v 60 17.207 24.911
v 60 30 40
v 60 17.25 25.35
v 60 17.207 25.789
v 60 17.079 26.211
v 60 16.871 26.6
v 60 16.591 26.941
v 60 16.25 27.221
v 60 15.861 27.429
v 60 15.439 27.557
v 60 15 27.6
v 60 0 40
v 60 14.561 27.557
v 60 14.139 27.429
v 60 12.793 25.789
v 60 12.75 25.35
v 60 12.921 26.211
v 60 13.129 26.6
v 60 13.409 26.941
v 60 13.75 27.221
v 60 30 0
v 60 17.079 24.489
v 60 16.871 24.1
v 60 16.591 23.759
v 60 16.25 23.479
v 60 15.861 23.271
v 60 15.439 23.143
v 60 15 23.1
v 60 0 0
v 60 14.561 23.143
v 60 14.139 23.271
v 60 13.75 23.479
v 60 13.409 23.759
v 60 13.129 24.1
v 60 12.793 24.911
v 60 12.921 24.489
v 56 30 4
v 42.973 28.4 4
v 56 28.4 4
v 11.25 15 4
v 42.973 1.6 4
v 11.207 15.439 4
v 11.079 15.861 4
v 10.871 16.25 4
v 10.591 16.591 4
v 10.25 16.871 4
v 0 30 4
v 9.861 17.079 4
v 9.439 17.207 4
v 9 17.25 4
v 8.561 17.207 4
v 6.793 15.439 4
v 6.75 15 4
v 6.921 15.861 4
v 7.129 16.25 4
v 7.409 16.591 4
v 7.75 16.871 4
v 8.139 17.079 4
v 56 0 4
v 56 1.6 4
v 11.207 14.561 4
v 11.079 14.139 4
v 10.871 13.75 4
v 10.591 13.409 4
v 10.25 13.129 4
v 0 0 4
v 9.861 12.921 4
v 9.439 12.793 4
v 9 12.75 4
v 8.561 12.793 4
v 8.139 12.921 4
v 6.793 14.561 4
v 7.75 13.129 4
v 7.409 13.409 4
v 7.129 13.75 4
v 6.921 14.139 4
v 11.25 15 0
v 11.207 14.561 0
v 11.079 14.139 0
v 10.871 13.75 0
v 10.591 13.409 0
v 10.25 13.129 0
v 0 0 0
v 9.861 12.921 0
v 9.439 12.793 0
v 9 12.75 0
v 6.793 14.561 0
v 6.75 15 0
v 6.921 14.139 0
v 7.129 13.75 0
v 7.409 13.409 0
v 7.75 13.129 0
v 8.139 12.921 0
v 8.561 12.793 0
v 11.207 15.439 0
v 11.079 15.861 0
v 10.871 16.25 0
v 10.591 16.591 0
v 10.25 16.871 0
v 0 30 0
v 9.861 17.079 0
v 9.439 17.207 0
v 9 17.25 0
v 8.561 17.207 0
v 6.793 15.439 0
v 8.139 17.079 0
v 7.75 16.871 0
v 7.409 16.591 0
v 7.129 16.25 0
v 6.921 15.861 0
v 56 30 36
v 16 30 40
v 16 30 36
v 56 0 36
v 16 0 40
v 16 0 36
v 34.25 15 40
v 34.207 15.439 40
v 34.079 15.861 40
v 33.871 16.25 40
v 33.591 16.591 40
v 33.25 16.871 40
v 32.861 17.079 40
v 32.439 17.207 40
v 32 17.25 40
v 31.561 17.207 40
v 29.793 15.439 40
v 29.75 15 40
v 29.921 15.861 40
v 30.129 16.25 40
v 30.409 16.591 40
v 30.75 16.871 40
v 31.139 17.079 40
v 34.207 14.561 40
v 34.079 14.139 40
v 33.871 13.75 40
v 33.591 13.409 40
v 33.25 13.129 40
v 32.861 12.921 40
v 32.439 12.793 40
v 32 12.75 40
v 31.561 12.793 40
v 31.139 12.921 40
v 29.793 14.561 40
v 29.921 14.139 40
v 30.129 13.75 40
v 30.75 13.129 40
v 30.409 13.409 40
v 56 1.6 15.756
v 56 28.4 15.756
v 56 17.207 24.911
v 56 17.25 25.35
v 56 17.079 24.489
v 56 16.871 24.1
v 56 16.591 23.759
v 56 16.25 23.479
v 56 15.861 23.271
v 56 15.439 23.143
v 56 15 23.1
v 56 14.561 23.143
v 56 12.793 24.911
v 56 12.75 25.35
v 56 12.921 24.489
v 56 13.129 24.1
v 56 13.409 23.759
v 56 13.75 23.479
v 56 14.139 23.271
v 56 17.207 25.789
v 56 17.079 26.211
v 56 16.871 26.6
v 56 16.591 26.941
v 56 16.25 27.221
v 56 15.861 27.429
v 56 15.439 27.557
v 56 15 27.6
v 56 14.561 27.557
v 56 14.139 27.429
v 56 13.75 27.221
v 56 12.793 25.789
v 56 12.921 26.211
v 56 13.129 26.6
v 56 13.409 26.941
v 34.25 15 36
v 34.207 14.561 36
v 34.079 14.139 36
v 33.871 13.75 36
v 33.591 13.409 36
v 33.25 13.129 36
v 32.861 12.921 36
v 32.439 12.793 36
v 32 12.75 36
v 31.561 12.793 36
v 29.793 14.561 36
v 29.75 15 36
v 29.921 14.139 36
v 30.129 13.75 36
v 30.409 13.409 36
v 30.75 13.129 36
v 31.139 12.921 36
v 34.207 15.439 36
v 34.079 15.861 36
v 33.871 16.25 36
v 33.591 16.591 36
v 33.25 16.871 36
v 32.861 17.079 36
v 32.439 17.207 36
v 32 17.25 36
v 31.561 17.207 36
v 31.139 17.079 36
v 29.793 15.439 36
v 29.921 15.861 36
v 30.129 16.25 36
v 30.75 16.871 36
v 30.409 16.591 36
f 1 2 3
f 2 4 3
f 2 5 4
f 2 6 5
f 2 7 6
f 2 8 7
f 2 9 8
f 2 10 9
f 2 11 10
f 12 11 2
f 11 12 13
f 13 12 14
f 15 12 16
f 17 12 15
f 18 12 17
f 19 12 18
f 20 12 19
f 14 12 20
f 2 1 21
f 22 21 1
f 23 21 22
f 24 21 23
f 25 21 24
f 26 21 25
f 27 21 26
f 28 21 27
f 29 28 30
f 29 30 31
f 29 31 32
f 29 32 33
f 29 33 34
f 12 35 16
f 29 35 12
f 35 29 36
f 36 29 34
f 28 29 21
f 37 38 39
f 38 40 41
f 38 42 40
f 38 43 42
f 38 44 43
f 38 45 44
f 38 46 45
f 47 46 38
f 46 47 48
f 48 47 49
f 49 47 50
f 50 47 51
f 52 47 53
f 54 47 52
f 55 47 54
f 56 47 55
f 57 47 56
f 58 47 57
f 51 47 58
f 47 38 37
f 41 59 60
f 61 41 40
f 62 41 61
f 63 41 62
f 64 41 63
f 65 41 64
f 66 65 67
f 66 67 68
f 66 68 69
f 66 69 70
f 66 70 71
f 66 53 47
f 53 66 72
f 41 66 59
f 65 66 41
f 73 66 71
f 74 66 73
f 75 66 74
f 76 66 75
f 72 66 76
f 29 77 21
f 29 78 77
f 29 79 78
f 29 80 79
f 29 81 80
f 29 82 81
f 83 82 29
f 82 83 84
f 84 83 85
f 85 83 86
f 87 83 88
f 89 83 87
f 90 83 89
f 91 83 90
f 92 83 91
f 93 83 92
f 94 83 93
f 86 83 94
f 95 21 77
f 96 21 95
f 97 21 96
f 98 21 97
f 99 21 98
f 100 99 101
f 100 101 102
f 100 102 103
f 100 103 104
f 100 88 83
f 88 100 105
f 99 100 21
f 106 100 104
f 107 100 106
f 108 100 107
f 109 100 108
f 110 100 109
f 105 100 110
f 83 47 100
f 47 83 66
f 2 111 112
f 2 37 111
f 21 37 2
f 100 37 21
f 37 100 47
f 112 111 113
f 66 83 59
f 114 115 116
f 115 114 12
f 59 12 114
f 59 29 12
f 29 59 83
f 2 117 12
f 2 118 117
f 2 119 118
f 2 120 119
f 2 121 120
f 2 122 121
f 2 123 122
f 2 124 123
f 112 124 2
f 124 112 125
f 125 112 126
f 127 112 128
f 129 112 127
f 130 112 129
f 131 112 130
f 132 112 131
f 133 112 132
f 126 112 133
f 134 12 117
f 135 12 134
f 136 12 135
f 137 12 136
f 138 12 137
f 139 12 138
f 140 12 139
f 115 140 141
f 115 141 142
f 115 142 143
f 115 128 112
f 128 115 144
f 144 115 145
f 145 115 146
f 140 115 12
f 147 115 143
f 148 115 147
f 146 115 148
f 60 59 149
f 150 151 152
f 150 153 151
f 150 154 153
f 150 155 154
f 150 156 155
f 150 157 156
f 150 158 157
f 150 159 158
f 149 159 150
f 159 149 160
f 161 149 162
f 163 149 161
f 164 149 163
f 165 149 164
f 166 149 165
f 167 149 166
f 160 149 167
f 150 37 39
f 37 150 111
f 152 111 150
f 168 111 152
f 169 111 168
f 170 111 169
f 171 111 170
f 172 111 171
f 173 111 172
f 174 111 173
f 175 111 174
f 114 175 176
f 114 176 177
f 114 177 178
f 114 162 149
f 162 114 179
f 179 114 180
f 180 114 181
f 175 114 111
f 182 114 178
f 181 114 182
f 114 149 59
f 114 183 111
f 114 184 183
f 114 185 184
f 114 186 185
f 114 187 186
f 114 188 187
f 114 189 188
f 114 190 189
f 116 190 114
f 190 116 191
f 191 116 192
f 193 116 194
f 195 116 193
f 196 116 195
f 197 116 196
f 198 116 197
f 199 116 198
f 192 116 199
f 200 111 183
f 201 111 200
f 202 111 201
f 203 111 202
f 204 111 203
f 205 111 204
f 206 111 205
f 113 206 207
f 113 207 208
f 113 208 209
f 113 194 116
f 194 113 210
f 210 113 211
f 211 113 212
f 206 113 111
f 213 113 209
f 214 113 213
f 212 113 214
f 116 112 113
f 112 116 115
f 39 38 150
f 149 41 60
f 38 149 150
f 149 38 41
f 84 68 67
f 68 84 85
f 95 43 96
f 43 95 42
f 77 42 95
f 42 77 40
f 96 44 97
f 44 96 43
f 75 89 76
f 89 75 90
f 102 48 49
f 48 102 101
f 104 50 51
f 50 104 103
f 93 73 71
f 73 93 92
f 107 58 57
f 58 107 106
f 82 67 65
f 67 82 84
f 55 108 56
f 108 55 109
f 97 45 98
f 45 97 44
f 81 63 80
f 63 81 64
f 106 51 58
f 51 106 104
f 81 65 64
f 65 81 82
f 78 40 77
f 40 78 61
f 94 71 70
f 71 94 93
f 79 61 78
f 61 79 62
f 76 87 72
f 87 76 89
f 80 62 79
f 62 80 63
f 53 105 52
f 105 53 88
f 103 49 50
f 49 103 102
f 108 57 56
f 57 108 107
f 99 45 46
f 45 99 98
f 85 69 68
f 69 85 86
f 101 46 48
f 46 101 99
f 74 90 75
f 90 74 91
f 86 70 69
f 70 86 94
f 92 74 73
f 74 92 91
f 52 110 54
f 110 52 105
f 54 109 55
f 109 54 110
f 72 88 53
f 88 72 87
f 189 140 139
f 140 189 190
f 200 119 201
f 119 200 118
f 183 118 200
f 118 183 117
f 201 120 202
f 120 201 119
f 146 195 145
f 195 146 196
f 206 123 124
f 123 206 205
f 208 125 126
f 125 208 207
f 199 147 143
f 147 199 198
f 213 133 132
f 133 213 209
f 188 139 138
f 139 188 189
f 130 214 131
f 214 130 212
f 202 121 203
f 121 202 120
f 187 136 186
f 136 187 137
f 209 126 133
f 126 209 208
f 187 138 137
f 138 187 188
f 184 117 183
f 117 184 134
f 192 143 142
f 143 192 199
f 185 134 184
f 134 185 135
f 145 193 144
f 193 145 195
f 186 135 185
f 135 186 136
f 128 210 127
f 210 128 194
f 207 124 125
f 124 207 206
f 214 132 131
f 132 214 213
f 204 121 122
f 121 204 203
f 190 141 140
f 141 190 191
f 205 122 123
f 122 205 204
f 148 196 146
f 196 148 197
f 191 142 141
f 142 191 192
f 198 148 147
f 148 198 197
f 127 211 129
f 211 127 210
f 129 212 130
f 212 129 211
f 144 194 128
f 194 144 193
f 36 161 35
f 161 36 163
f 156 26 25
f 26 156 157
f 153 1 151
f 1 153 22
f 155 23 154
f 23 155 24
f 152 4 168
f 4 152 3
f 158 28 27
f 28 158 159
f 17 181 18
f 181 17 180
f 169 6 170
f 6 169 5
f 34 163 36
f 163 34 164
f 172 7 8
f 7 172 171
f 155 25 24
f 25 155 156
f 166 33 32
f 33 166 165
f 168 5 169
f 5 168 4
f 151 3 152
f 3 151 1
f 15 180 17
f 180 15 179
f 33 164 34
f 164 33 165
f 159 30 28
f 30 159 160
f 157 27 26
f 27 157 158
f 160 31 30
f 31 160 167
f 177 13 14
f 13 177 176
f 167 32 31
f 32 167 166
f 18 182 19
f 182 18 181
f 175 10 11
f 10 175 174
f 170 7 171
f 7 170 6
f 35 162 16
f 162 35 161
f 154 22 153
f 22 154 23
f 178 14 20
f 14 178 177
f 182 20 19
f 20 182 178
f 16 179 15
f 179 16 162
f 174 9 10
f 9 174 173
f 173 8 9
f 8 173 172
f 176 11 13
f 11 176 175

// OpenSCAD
$fn = 32;

// ----------------------------------------------------------------------
// Z-bracket: 60 x 30 x 40 mm
// ----------------------------------------------------------------------

// --- parameters (mm) ---
lower_len = 60;           // lower foot length, X
upper_len = 40;           // upper foot length, X
width = 30;               // bracket width, Y
rise = 40;                // overall rise, Z
thick = 4;                // plate thickness
hole_d = 4.5;             // clearance for M4
rib_len = 14.8;           // gusset leg
rib_sink = 1.6;           // gusset overlap into the plates

module hole_z(px, py, z0) {
  translate([px, py, z0 - 2.5]) cylinder(h = thick + 5, d = hole_d);
}
module hole_x(py, pz) {
  translate([-2.5, py, pz]) rotate([0, 90, 0]) cylinder(h = thick + 5, d = hole_d);
}
module gusset(x0) {
  translate([x0, width - rib_sink, 0])
    rotate([90, 0, 0])
      linear_extrude(height = width - 2 * rib_sink)
        polygon(points = [[rib_sink, thick - rib_sink],
                          [rib_sink, thick - rib_sink + rib_len],
                          [-rib_len, thick - rib_sink]]);
}

difference() {
  union() {
    cube([lower_len, width, thick]);
    /* web, overlapping the lower foot */
    translate([lower_len - thick, 0, 0]) cube([thick, width, rise]);
    /* upper foot, sunk into the web */
    translate([lower_len - thick - upper_len, 0, rise - thick]) cube([upper_len + thick, width, thick]);
    gusset(lower_len - thick);
  }
  hole_z(9, 15, 0);
  translate([lower_len - thick - 24, 0, 0]) hole_z(0, 15, rise - thick);
  translate([lower_len - thick, 0, 0]) hole_x(15, 25.35);
}
